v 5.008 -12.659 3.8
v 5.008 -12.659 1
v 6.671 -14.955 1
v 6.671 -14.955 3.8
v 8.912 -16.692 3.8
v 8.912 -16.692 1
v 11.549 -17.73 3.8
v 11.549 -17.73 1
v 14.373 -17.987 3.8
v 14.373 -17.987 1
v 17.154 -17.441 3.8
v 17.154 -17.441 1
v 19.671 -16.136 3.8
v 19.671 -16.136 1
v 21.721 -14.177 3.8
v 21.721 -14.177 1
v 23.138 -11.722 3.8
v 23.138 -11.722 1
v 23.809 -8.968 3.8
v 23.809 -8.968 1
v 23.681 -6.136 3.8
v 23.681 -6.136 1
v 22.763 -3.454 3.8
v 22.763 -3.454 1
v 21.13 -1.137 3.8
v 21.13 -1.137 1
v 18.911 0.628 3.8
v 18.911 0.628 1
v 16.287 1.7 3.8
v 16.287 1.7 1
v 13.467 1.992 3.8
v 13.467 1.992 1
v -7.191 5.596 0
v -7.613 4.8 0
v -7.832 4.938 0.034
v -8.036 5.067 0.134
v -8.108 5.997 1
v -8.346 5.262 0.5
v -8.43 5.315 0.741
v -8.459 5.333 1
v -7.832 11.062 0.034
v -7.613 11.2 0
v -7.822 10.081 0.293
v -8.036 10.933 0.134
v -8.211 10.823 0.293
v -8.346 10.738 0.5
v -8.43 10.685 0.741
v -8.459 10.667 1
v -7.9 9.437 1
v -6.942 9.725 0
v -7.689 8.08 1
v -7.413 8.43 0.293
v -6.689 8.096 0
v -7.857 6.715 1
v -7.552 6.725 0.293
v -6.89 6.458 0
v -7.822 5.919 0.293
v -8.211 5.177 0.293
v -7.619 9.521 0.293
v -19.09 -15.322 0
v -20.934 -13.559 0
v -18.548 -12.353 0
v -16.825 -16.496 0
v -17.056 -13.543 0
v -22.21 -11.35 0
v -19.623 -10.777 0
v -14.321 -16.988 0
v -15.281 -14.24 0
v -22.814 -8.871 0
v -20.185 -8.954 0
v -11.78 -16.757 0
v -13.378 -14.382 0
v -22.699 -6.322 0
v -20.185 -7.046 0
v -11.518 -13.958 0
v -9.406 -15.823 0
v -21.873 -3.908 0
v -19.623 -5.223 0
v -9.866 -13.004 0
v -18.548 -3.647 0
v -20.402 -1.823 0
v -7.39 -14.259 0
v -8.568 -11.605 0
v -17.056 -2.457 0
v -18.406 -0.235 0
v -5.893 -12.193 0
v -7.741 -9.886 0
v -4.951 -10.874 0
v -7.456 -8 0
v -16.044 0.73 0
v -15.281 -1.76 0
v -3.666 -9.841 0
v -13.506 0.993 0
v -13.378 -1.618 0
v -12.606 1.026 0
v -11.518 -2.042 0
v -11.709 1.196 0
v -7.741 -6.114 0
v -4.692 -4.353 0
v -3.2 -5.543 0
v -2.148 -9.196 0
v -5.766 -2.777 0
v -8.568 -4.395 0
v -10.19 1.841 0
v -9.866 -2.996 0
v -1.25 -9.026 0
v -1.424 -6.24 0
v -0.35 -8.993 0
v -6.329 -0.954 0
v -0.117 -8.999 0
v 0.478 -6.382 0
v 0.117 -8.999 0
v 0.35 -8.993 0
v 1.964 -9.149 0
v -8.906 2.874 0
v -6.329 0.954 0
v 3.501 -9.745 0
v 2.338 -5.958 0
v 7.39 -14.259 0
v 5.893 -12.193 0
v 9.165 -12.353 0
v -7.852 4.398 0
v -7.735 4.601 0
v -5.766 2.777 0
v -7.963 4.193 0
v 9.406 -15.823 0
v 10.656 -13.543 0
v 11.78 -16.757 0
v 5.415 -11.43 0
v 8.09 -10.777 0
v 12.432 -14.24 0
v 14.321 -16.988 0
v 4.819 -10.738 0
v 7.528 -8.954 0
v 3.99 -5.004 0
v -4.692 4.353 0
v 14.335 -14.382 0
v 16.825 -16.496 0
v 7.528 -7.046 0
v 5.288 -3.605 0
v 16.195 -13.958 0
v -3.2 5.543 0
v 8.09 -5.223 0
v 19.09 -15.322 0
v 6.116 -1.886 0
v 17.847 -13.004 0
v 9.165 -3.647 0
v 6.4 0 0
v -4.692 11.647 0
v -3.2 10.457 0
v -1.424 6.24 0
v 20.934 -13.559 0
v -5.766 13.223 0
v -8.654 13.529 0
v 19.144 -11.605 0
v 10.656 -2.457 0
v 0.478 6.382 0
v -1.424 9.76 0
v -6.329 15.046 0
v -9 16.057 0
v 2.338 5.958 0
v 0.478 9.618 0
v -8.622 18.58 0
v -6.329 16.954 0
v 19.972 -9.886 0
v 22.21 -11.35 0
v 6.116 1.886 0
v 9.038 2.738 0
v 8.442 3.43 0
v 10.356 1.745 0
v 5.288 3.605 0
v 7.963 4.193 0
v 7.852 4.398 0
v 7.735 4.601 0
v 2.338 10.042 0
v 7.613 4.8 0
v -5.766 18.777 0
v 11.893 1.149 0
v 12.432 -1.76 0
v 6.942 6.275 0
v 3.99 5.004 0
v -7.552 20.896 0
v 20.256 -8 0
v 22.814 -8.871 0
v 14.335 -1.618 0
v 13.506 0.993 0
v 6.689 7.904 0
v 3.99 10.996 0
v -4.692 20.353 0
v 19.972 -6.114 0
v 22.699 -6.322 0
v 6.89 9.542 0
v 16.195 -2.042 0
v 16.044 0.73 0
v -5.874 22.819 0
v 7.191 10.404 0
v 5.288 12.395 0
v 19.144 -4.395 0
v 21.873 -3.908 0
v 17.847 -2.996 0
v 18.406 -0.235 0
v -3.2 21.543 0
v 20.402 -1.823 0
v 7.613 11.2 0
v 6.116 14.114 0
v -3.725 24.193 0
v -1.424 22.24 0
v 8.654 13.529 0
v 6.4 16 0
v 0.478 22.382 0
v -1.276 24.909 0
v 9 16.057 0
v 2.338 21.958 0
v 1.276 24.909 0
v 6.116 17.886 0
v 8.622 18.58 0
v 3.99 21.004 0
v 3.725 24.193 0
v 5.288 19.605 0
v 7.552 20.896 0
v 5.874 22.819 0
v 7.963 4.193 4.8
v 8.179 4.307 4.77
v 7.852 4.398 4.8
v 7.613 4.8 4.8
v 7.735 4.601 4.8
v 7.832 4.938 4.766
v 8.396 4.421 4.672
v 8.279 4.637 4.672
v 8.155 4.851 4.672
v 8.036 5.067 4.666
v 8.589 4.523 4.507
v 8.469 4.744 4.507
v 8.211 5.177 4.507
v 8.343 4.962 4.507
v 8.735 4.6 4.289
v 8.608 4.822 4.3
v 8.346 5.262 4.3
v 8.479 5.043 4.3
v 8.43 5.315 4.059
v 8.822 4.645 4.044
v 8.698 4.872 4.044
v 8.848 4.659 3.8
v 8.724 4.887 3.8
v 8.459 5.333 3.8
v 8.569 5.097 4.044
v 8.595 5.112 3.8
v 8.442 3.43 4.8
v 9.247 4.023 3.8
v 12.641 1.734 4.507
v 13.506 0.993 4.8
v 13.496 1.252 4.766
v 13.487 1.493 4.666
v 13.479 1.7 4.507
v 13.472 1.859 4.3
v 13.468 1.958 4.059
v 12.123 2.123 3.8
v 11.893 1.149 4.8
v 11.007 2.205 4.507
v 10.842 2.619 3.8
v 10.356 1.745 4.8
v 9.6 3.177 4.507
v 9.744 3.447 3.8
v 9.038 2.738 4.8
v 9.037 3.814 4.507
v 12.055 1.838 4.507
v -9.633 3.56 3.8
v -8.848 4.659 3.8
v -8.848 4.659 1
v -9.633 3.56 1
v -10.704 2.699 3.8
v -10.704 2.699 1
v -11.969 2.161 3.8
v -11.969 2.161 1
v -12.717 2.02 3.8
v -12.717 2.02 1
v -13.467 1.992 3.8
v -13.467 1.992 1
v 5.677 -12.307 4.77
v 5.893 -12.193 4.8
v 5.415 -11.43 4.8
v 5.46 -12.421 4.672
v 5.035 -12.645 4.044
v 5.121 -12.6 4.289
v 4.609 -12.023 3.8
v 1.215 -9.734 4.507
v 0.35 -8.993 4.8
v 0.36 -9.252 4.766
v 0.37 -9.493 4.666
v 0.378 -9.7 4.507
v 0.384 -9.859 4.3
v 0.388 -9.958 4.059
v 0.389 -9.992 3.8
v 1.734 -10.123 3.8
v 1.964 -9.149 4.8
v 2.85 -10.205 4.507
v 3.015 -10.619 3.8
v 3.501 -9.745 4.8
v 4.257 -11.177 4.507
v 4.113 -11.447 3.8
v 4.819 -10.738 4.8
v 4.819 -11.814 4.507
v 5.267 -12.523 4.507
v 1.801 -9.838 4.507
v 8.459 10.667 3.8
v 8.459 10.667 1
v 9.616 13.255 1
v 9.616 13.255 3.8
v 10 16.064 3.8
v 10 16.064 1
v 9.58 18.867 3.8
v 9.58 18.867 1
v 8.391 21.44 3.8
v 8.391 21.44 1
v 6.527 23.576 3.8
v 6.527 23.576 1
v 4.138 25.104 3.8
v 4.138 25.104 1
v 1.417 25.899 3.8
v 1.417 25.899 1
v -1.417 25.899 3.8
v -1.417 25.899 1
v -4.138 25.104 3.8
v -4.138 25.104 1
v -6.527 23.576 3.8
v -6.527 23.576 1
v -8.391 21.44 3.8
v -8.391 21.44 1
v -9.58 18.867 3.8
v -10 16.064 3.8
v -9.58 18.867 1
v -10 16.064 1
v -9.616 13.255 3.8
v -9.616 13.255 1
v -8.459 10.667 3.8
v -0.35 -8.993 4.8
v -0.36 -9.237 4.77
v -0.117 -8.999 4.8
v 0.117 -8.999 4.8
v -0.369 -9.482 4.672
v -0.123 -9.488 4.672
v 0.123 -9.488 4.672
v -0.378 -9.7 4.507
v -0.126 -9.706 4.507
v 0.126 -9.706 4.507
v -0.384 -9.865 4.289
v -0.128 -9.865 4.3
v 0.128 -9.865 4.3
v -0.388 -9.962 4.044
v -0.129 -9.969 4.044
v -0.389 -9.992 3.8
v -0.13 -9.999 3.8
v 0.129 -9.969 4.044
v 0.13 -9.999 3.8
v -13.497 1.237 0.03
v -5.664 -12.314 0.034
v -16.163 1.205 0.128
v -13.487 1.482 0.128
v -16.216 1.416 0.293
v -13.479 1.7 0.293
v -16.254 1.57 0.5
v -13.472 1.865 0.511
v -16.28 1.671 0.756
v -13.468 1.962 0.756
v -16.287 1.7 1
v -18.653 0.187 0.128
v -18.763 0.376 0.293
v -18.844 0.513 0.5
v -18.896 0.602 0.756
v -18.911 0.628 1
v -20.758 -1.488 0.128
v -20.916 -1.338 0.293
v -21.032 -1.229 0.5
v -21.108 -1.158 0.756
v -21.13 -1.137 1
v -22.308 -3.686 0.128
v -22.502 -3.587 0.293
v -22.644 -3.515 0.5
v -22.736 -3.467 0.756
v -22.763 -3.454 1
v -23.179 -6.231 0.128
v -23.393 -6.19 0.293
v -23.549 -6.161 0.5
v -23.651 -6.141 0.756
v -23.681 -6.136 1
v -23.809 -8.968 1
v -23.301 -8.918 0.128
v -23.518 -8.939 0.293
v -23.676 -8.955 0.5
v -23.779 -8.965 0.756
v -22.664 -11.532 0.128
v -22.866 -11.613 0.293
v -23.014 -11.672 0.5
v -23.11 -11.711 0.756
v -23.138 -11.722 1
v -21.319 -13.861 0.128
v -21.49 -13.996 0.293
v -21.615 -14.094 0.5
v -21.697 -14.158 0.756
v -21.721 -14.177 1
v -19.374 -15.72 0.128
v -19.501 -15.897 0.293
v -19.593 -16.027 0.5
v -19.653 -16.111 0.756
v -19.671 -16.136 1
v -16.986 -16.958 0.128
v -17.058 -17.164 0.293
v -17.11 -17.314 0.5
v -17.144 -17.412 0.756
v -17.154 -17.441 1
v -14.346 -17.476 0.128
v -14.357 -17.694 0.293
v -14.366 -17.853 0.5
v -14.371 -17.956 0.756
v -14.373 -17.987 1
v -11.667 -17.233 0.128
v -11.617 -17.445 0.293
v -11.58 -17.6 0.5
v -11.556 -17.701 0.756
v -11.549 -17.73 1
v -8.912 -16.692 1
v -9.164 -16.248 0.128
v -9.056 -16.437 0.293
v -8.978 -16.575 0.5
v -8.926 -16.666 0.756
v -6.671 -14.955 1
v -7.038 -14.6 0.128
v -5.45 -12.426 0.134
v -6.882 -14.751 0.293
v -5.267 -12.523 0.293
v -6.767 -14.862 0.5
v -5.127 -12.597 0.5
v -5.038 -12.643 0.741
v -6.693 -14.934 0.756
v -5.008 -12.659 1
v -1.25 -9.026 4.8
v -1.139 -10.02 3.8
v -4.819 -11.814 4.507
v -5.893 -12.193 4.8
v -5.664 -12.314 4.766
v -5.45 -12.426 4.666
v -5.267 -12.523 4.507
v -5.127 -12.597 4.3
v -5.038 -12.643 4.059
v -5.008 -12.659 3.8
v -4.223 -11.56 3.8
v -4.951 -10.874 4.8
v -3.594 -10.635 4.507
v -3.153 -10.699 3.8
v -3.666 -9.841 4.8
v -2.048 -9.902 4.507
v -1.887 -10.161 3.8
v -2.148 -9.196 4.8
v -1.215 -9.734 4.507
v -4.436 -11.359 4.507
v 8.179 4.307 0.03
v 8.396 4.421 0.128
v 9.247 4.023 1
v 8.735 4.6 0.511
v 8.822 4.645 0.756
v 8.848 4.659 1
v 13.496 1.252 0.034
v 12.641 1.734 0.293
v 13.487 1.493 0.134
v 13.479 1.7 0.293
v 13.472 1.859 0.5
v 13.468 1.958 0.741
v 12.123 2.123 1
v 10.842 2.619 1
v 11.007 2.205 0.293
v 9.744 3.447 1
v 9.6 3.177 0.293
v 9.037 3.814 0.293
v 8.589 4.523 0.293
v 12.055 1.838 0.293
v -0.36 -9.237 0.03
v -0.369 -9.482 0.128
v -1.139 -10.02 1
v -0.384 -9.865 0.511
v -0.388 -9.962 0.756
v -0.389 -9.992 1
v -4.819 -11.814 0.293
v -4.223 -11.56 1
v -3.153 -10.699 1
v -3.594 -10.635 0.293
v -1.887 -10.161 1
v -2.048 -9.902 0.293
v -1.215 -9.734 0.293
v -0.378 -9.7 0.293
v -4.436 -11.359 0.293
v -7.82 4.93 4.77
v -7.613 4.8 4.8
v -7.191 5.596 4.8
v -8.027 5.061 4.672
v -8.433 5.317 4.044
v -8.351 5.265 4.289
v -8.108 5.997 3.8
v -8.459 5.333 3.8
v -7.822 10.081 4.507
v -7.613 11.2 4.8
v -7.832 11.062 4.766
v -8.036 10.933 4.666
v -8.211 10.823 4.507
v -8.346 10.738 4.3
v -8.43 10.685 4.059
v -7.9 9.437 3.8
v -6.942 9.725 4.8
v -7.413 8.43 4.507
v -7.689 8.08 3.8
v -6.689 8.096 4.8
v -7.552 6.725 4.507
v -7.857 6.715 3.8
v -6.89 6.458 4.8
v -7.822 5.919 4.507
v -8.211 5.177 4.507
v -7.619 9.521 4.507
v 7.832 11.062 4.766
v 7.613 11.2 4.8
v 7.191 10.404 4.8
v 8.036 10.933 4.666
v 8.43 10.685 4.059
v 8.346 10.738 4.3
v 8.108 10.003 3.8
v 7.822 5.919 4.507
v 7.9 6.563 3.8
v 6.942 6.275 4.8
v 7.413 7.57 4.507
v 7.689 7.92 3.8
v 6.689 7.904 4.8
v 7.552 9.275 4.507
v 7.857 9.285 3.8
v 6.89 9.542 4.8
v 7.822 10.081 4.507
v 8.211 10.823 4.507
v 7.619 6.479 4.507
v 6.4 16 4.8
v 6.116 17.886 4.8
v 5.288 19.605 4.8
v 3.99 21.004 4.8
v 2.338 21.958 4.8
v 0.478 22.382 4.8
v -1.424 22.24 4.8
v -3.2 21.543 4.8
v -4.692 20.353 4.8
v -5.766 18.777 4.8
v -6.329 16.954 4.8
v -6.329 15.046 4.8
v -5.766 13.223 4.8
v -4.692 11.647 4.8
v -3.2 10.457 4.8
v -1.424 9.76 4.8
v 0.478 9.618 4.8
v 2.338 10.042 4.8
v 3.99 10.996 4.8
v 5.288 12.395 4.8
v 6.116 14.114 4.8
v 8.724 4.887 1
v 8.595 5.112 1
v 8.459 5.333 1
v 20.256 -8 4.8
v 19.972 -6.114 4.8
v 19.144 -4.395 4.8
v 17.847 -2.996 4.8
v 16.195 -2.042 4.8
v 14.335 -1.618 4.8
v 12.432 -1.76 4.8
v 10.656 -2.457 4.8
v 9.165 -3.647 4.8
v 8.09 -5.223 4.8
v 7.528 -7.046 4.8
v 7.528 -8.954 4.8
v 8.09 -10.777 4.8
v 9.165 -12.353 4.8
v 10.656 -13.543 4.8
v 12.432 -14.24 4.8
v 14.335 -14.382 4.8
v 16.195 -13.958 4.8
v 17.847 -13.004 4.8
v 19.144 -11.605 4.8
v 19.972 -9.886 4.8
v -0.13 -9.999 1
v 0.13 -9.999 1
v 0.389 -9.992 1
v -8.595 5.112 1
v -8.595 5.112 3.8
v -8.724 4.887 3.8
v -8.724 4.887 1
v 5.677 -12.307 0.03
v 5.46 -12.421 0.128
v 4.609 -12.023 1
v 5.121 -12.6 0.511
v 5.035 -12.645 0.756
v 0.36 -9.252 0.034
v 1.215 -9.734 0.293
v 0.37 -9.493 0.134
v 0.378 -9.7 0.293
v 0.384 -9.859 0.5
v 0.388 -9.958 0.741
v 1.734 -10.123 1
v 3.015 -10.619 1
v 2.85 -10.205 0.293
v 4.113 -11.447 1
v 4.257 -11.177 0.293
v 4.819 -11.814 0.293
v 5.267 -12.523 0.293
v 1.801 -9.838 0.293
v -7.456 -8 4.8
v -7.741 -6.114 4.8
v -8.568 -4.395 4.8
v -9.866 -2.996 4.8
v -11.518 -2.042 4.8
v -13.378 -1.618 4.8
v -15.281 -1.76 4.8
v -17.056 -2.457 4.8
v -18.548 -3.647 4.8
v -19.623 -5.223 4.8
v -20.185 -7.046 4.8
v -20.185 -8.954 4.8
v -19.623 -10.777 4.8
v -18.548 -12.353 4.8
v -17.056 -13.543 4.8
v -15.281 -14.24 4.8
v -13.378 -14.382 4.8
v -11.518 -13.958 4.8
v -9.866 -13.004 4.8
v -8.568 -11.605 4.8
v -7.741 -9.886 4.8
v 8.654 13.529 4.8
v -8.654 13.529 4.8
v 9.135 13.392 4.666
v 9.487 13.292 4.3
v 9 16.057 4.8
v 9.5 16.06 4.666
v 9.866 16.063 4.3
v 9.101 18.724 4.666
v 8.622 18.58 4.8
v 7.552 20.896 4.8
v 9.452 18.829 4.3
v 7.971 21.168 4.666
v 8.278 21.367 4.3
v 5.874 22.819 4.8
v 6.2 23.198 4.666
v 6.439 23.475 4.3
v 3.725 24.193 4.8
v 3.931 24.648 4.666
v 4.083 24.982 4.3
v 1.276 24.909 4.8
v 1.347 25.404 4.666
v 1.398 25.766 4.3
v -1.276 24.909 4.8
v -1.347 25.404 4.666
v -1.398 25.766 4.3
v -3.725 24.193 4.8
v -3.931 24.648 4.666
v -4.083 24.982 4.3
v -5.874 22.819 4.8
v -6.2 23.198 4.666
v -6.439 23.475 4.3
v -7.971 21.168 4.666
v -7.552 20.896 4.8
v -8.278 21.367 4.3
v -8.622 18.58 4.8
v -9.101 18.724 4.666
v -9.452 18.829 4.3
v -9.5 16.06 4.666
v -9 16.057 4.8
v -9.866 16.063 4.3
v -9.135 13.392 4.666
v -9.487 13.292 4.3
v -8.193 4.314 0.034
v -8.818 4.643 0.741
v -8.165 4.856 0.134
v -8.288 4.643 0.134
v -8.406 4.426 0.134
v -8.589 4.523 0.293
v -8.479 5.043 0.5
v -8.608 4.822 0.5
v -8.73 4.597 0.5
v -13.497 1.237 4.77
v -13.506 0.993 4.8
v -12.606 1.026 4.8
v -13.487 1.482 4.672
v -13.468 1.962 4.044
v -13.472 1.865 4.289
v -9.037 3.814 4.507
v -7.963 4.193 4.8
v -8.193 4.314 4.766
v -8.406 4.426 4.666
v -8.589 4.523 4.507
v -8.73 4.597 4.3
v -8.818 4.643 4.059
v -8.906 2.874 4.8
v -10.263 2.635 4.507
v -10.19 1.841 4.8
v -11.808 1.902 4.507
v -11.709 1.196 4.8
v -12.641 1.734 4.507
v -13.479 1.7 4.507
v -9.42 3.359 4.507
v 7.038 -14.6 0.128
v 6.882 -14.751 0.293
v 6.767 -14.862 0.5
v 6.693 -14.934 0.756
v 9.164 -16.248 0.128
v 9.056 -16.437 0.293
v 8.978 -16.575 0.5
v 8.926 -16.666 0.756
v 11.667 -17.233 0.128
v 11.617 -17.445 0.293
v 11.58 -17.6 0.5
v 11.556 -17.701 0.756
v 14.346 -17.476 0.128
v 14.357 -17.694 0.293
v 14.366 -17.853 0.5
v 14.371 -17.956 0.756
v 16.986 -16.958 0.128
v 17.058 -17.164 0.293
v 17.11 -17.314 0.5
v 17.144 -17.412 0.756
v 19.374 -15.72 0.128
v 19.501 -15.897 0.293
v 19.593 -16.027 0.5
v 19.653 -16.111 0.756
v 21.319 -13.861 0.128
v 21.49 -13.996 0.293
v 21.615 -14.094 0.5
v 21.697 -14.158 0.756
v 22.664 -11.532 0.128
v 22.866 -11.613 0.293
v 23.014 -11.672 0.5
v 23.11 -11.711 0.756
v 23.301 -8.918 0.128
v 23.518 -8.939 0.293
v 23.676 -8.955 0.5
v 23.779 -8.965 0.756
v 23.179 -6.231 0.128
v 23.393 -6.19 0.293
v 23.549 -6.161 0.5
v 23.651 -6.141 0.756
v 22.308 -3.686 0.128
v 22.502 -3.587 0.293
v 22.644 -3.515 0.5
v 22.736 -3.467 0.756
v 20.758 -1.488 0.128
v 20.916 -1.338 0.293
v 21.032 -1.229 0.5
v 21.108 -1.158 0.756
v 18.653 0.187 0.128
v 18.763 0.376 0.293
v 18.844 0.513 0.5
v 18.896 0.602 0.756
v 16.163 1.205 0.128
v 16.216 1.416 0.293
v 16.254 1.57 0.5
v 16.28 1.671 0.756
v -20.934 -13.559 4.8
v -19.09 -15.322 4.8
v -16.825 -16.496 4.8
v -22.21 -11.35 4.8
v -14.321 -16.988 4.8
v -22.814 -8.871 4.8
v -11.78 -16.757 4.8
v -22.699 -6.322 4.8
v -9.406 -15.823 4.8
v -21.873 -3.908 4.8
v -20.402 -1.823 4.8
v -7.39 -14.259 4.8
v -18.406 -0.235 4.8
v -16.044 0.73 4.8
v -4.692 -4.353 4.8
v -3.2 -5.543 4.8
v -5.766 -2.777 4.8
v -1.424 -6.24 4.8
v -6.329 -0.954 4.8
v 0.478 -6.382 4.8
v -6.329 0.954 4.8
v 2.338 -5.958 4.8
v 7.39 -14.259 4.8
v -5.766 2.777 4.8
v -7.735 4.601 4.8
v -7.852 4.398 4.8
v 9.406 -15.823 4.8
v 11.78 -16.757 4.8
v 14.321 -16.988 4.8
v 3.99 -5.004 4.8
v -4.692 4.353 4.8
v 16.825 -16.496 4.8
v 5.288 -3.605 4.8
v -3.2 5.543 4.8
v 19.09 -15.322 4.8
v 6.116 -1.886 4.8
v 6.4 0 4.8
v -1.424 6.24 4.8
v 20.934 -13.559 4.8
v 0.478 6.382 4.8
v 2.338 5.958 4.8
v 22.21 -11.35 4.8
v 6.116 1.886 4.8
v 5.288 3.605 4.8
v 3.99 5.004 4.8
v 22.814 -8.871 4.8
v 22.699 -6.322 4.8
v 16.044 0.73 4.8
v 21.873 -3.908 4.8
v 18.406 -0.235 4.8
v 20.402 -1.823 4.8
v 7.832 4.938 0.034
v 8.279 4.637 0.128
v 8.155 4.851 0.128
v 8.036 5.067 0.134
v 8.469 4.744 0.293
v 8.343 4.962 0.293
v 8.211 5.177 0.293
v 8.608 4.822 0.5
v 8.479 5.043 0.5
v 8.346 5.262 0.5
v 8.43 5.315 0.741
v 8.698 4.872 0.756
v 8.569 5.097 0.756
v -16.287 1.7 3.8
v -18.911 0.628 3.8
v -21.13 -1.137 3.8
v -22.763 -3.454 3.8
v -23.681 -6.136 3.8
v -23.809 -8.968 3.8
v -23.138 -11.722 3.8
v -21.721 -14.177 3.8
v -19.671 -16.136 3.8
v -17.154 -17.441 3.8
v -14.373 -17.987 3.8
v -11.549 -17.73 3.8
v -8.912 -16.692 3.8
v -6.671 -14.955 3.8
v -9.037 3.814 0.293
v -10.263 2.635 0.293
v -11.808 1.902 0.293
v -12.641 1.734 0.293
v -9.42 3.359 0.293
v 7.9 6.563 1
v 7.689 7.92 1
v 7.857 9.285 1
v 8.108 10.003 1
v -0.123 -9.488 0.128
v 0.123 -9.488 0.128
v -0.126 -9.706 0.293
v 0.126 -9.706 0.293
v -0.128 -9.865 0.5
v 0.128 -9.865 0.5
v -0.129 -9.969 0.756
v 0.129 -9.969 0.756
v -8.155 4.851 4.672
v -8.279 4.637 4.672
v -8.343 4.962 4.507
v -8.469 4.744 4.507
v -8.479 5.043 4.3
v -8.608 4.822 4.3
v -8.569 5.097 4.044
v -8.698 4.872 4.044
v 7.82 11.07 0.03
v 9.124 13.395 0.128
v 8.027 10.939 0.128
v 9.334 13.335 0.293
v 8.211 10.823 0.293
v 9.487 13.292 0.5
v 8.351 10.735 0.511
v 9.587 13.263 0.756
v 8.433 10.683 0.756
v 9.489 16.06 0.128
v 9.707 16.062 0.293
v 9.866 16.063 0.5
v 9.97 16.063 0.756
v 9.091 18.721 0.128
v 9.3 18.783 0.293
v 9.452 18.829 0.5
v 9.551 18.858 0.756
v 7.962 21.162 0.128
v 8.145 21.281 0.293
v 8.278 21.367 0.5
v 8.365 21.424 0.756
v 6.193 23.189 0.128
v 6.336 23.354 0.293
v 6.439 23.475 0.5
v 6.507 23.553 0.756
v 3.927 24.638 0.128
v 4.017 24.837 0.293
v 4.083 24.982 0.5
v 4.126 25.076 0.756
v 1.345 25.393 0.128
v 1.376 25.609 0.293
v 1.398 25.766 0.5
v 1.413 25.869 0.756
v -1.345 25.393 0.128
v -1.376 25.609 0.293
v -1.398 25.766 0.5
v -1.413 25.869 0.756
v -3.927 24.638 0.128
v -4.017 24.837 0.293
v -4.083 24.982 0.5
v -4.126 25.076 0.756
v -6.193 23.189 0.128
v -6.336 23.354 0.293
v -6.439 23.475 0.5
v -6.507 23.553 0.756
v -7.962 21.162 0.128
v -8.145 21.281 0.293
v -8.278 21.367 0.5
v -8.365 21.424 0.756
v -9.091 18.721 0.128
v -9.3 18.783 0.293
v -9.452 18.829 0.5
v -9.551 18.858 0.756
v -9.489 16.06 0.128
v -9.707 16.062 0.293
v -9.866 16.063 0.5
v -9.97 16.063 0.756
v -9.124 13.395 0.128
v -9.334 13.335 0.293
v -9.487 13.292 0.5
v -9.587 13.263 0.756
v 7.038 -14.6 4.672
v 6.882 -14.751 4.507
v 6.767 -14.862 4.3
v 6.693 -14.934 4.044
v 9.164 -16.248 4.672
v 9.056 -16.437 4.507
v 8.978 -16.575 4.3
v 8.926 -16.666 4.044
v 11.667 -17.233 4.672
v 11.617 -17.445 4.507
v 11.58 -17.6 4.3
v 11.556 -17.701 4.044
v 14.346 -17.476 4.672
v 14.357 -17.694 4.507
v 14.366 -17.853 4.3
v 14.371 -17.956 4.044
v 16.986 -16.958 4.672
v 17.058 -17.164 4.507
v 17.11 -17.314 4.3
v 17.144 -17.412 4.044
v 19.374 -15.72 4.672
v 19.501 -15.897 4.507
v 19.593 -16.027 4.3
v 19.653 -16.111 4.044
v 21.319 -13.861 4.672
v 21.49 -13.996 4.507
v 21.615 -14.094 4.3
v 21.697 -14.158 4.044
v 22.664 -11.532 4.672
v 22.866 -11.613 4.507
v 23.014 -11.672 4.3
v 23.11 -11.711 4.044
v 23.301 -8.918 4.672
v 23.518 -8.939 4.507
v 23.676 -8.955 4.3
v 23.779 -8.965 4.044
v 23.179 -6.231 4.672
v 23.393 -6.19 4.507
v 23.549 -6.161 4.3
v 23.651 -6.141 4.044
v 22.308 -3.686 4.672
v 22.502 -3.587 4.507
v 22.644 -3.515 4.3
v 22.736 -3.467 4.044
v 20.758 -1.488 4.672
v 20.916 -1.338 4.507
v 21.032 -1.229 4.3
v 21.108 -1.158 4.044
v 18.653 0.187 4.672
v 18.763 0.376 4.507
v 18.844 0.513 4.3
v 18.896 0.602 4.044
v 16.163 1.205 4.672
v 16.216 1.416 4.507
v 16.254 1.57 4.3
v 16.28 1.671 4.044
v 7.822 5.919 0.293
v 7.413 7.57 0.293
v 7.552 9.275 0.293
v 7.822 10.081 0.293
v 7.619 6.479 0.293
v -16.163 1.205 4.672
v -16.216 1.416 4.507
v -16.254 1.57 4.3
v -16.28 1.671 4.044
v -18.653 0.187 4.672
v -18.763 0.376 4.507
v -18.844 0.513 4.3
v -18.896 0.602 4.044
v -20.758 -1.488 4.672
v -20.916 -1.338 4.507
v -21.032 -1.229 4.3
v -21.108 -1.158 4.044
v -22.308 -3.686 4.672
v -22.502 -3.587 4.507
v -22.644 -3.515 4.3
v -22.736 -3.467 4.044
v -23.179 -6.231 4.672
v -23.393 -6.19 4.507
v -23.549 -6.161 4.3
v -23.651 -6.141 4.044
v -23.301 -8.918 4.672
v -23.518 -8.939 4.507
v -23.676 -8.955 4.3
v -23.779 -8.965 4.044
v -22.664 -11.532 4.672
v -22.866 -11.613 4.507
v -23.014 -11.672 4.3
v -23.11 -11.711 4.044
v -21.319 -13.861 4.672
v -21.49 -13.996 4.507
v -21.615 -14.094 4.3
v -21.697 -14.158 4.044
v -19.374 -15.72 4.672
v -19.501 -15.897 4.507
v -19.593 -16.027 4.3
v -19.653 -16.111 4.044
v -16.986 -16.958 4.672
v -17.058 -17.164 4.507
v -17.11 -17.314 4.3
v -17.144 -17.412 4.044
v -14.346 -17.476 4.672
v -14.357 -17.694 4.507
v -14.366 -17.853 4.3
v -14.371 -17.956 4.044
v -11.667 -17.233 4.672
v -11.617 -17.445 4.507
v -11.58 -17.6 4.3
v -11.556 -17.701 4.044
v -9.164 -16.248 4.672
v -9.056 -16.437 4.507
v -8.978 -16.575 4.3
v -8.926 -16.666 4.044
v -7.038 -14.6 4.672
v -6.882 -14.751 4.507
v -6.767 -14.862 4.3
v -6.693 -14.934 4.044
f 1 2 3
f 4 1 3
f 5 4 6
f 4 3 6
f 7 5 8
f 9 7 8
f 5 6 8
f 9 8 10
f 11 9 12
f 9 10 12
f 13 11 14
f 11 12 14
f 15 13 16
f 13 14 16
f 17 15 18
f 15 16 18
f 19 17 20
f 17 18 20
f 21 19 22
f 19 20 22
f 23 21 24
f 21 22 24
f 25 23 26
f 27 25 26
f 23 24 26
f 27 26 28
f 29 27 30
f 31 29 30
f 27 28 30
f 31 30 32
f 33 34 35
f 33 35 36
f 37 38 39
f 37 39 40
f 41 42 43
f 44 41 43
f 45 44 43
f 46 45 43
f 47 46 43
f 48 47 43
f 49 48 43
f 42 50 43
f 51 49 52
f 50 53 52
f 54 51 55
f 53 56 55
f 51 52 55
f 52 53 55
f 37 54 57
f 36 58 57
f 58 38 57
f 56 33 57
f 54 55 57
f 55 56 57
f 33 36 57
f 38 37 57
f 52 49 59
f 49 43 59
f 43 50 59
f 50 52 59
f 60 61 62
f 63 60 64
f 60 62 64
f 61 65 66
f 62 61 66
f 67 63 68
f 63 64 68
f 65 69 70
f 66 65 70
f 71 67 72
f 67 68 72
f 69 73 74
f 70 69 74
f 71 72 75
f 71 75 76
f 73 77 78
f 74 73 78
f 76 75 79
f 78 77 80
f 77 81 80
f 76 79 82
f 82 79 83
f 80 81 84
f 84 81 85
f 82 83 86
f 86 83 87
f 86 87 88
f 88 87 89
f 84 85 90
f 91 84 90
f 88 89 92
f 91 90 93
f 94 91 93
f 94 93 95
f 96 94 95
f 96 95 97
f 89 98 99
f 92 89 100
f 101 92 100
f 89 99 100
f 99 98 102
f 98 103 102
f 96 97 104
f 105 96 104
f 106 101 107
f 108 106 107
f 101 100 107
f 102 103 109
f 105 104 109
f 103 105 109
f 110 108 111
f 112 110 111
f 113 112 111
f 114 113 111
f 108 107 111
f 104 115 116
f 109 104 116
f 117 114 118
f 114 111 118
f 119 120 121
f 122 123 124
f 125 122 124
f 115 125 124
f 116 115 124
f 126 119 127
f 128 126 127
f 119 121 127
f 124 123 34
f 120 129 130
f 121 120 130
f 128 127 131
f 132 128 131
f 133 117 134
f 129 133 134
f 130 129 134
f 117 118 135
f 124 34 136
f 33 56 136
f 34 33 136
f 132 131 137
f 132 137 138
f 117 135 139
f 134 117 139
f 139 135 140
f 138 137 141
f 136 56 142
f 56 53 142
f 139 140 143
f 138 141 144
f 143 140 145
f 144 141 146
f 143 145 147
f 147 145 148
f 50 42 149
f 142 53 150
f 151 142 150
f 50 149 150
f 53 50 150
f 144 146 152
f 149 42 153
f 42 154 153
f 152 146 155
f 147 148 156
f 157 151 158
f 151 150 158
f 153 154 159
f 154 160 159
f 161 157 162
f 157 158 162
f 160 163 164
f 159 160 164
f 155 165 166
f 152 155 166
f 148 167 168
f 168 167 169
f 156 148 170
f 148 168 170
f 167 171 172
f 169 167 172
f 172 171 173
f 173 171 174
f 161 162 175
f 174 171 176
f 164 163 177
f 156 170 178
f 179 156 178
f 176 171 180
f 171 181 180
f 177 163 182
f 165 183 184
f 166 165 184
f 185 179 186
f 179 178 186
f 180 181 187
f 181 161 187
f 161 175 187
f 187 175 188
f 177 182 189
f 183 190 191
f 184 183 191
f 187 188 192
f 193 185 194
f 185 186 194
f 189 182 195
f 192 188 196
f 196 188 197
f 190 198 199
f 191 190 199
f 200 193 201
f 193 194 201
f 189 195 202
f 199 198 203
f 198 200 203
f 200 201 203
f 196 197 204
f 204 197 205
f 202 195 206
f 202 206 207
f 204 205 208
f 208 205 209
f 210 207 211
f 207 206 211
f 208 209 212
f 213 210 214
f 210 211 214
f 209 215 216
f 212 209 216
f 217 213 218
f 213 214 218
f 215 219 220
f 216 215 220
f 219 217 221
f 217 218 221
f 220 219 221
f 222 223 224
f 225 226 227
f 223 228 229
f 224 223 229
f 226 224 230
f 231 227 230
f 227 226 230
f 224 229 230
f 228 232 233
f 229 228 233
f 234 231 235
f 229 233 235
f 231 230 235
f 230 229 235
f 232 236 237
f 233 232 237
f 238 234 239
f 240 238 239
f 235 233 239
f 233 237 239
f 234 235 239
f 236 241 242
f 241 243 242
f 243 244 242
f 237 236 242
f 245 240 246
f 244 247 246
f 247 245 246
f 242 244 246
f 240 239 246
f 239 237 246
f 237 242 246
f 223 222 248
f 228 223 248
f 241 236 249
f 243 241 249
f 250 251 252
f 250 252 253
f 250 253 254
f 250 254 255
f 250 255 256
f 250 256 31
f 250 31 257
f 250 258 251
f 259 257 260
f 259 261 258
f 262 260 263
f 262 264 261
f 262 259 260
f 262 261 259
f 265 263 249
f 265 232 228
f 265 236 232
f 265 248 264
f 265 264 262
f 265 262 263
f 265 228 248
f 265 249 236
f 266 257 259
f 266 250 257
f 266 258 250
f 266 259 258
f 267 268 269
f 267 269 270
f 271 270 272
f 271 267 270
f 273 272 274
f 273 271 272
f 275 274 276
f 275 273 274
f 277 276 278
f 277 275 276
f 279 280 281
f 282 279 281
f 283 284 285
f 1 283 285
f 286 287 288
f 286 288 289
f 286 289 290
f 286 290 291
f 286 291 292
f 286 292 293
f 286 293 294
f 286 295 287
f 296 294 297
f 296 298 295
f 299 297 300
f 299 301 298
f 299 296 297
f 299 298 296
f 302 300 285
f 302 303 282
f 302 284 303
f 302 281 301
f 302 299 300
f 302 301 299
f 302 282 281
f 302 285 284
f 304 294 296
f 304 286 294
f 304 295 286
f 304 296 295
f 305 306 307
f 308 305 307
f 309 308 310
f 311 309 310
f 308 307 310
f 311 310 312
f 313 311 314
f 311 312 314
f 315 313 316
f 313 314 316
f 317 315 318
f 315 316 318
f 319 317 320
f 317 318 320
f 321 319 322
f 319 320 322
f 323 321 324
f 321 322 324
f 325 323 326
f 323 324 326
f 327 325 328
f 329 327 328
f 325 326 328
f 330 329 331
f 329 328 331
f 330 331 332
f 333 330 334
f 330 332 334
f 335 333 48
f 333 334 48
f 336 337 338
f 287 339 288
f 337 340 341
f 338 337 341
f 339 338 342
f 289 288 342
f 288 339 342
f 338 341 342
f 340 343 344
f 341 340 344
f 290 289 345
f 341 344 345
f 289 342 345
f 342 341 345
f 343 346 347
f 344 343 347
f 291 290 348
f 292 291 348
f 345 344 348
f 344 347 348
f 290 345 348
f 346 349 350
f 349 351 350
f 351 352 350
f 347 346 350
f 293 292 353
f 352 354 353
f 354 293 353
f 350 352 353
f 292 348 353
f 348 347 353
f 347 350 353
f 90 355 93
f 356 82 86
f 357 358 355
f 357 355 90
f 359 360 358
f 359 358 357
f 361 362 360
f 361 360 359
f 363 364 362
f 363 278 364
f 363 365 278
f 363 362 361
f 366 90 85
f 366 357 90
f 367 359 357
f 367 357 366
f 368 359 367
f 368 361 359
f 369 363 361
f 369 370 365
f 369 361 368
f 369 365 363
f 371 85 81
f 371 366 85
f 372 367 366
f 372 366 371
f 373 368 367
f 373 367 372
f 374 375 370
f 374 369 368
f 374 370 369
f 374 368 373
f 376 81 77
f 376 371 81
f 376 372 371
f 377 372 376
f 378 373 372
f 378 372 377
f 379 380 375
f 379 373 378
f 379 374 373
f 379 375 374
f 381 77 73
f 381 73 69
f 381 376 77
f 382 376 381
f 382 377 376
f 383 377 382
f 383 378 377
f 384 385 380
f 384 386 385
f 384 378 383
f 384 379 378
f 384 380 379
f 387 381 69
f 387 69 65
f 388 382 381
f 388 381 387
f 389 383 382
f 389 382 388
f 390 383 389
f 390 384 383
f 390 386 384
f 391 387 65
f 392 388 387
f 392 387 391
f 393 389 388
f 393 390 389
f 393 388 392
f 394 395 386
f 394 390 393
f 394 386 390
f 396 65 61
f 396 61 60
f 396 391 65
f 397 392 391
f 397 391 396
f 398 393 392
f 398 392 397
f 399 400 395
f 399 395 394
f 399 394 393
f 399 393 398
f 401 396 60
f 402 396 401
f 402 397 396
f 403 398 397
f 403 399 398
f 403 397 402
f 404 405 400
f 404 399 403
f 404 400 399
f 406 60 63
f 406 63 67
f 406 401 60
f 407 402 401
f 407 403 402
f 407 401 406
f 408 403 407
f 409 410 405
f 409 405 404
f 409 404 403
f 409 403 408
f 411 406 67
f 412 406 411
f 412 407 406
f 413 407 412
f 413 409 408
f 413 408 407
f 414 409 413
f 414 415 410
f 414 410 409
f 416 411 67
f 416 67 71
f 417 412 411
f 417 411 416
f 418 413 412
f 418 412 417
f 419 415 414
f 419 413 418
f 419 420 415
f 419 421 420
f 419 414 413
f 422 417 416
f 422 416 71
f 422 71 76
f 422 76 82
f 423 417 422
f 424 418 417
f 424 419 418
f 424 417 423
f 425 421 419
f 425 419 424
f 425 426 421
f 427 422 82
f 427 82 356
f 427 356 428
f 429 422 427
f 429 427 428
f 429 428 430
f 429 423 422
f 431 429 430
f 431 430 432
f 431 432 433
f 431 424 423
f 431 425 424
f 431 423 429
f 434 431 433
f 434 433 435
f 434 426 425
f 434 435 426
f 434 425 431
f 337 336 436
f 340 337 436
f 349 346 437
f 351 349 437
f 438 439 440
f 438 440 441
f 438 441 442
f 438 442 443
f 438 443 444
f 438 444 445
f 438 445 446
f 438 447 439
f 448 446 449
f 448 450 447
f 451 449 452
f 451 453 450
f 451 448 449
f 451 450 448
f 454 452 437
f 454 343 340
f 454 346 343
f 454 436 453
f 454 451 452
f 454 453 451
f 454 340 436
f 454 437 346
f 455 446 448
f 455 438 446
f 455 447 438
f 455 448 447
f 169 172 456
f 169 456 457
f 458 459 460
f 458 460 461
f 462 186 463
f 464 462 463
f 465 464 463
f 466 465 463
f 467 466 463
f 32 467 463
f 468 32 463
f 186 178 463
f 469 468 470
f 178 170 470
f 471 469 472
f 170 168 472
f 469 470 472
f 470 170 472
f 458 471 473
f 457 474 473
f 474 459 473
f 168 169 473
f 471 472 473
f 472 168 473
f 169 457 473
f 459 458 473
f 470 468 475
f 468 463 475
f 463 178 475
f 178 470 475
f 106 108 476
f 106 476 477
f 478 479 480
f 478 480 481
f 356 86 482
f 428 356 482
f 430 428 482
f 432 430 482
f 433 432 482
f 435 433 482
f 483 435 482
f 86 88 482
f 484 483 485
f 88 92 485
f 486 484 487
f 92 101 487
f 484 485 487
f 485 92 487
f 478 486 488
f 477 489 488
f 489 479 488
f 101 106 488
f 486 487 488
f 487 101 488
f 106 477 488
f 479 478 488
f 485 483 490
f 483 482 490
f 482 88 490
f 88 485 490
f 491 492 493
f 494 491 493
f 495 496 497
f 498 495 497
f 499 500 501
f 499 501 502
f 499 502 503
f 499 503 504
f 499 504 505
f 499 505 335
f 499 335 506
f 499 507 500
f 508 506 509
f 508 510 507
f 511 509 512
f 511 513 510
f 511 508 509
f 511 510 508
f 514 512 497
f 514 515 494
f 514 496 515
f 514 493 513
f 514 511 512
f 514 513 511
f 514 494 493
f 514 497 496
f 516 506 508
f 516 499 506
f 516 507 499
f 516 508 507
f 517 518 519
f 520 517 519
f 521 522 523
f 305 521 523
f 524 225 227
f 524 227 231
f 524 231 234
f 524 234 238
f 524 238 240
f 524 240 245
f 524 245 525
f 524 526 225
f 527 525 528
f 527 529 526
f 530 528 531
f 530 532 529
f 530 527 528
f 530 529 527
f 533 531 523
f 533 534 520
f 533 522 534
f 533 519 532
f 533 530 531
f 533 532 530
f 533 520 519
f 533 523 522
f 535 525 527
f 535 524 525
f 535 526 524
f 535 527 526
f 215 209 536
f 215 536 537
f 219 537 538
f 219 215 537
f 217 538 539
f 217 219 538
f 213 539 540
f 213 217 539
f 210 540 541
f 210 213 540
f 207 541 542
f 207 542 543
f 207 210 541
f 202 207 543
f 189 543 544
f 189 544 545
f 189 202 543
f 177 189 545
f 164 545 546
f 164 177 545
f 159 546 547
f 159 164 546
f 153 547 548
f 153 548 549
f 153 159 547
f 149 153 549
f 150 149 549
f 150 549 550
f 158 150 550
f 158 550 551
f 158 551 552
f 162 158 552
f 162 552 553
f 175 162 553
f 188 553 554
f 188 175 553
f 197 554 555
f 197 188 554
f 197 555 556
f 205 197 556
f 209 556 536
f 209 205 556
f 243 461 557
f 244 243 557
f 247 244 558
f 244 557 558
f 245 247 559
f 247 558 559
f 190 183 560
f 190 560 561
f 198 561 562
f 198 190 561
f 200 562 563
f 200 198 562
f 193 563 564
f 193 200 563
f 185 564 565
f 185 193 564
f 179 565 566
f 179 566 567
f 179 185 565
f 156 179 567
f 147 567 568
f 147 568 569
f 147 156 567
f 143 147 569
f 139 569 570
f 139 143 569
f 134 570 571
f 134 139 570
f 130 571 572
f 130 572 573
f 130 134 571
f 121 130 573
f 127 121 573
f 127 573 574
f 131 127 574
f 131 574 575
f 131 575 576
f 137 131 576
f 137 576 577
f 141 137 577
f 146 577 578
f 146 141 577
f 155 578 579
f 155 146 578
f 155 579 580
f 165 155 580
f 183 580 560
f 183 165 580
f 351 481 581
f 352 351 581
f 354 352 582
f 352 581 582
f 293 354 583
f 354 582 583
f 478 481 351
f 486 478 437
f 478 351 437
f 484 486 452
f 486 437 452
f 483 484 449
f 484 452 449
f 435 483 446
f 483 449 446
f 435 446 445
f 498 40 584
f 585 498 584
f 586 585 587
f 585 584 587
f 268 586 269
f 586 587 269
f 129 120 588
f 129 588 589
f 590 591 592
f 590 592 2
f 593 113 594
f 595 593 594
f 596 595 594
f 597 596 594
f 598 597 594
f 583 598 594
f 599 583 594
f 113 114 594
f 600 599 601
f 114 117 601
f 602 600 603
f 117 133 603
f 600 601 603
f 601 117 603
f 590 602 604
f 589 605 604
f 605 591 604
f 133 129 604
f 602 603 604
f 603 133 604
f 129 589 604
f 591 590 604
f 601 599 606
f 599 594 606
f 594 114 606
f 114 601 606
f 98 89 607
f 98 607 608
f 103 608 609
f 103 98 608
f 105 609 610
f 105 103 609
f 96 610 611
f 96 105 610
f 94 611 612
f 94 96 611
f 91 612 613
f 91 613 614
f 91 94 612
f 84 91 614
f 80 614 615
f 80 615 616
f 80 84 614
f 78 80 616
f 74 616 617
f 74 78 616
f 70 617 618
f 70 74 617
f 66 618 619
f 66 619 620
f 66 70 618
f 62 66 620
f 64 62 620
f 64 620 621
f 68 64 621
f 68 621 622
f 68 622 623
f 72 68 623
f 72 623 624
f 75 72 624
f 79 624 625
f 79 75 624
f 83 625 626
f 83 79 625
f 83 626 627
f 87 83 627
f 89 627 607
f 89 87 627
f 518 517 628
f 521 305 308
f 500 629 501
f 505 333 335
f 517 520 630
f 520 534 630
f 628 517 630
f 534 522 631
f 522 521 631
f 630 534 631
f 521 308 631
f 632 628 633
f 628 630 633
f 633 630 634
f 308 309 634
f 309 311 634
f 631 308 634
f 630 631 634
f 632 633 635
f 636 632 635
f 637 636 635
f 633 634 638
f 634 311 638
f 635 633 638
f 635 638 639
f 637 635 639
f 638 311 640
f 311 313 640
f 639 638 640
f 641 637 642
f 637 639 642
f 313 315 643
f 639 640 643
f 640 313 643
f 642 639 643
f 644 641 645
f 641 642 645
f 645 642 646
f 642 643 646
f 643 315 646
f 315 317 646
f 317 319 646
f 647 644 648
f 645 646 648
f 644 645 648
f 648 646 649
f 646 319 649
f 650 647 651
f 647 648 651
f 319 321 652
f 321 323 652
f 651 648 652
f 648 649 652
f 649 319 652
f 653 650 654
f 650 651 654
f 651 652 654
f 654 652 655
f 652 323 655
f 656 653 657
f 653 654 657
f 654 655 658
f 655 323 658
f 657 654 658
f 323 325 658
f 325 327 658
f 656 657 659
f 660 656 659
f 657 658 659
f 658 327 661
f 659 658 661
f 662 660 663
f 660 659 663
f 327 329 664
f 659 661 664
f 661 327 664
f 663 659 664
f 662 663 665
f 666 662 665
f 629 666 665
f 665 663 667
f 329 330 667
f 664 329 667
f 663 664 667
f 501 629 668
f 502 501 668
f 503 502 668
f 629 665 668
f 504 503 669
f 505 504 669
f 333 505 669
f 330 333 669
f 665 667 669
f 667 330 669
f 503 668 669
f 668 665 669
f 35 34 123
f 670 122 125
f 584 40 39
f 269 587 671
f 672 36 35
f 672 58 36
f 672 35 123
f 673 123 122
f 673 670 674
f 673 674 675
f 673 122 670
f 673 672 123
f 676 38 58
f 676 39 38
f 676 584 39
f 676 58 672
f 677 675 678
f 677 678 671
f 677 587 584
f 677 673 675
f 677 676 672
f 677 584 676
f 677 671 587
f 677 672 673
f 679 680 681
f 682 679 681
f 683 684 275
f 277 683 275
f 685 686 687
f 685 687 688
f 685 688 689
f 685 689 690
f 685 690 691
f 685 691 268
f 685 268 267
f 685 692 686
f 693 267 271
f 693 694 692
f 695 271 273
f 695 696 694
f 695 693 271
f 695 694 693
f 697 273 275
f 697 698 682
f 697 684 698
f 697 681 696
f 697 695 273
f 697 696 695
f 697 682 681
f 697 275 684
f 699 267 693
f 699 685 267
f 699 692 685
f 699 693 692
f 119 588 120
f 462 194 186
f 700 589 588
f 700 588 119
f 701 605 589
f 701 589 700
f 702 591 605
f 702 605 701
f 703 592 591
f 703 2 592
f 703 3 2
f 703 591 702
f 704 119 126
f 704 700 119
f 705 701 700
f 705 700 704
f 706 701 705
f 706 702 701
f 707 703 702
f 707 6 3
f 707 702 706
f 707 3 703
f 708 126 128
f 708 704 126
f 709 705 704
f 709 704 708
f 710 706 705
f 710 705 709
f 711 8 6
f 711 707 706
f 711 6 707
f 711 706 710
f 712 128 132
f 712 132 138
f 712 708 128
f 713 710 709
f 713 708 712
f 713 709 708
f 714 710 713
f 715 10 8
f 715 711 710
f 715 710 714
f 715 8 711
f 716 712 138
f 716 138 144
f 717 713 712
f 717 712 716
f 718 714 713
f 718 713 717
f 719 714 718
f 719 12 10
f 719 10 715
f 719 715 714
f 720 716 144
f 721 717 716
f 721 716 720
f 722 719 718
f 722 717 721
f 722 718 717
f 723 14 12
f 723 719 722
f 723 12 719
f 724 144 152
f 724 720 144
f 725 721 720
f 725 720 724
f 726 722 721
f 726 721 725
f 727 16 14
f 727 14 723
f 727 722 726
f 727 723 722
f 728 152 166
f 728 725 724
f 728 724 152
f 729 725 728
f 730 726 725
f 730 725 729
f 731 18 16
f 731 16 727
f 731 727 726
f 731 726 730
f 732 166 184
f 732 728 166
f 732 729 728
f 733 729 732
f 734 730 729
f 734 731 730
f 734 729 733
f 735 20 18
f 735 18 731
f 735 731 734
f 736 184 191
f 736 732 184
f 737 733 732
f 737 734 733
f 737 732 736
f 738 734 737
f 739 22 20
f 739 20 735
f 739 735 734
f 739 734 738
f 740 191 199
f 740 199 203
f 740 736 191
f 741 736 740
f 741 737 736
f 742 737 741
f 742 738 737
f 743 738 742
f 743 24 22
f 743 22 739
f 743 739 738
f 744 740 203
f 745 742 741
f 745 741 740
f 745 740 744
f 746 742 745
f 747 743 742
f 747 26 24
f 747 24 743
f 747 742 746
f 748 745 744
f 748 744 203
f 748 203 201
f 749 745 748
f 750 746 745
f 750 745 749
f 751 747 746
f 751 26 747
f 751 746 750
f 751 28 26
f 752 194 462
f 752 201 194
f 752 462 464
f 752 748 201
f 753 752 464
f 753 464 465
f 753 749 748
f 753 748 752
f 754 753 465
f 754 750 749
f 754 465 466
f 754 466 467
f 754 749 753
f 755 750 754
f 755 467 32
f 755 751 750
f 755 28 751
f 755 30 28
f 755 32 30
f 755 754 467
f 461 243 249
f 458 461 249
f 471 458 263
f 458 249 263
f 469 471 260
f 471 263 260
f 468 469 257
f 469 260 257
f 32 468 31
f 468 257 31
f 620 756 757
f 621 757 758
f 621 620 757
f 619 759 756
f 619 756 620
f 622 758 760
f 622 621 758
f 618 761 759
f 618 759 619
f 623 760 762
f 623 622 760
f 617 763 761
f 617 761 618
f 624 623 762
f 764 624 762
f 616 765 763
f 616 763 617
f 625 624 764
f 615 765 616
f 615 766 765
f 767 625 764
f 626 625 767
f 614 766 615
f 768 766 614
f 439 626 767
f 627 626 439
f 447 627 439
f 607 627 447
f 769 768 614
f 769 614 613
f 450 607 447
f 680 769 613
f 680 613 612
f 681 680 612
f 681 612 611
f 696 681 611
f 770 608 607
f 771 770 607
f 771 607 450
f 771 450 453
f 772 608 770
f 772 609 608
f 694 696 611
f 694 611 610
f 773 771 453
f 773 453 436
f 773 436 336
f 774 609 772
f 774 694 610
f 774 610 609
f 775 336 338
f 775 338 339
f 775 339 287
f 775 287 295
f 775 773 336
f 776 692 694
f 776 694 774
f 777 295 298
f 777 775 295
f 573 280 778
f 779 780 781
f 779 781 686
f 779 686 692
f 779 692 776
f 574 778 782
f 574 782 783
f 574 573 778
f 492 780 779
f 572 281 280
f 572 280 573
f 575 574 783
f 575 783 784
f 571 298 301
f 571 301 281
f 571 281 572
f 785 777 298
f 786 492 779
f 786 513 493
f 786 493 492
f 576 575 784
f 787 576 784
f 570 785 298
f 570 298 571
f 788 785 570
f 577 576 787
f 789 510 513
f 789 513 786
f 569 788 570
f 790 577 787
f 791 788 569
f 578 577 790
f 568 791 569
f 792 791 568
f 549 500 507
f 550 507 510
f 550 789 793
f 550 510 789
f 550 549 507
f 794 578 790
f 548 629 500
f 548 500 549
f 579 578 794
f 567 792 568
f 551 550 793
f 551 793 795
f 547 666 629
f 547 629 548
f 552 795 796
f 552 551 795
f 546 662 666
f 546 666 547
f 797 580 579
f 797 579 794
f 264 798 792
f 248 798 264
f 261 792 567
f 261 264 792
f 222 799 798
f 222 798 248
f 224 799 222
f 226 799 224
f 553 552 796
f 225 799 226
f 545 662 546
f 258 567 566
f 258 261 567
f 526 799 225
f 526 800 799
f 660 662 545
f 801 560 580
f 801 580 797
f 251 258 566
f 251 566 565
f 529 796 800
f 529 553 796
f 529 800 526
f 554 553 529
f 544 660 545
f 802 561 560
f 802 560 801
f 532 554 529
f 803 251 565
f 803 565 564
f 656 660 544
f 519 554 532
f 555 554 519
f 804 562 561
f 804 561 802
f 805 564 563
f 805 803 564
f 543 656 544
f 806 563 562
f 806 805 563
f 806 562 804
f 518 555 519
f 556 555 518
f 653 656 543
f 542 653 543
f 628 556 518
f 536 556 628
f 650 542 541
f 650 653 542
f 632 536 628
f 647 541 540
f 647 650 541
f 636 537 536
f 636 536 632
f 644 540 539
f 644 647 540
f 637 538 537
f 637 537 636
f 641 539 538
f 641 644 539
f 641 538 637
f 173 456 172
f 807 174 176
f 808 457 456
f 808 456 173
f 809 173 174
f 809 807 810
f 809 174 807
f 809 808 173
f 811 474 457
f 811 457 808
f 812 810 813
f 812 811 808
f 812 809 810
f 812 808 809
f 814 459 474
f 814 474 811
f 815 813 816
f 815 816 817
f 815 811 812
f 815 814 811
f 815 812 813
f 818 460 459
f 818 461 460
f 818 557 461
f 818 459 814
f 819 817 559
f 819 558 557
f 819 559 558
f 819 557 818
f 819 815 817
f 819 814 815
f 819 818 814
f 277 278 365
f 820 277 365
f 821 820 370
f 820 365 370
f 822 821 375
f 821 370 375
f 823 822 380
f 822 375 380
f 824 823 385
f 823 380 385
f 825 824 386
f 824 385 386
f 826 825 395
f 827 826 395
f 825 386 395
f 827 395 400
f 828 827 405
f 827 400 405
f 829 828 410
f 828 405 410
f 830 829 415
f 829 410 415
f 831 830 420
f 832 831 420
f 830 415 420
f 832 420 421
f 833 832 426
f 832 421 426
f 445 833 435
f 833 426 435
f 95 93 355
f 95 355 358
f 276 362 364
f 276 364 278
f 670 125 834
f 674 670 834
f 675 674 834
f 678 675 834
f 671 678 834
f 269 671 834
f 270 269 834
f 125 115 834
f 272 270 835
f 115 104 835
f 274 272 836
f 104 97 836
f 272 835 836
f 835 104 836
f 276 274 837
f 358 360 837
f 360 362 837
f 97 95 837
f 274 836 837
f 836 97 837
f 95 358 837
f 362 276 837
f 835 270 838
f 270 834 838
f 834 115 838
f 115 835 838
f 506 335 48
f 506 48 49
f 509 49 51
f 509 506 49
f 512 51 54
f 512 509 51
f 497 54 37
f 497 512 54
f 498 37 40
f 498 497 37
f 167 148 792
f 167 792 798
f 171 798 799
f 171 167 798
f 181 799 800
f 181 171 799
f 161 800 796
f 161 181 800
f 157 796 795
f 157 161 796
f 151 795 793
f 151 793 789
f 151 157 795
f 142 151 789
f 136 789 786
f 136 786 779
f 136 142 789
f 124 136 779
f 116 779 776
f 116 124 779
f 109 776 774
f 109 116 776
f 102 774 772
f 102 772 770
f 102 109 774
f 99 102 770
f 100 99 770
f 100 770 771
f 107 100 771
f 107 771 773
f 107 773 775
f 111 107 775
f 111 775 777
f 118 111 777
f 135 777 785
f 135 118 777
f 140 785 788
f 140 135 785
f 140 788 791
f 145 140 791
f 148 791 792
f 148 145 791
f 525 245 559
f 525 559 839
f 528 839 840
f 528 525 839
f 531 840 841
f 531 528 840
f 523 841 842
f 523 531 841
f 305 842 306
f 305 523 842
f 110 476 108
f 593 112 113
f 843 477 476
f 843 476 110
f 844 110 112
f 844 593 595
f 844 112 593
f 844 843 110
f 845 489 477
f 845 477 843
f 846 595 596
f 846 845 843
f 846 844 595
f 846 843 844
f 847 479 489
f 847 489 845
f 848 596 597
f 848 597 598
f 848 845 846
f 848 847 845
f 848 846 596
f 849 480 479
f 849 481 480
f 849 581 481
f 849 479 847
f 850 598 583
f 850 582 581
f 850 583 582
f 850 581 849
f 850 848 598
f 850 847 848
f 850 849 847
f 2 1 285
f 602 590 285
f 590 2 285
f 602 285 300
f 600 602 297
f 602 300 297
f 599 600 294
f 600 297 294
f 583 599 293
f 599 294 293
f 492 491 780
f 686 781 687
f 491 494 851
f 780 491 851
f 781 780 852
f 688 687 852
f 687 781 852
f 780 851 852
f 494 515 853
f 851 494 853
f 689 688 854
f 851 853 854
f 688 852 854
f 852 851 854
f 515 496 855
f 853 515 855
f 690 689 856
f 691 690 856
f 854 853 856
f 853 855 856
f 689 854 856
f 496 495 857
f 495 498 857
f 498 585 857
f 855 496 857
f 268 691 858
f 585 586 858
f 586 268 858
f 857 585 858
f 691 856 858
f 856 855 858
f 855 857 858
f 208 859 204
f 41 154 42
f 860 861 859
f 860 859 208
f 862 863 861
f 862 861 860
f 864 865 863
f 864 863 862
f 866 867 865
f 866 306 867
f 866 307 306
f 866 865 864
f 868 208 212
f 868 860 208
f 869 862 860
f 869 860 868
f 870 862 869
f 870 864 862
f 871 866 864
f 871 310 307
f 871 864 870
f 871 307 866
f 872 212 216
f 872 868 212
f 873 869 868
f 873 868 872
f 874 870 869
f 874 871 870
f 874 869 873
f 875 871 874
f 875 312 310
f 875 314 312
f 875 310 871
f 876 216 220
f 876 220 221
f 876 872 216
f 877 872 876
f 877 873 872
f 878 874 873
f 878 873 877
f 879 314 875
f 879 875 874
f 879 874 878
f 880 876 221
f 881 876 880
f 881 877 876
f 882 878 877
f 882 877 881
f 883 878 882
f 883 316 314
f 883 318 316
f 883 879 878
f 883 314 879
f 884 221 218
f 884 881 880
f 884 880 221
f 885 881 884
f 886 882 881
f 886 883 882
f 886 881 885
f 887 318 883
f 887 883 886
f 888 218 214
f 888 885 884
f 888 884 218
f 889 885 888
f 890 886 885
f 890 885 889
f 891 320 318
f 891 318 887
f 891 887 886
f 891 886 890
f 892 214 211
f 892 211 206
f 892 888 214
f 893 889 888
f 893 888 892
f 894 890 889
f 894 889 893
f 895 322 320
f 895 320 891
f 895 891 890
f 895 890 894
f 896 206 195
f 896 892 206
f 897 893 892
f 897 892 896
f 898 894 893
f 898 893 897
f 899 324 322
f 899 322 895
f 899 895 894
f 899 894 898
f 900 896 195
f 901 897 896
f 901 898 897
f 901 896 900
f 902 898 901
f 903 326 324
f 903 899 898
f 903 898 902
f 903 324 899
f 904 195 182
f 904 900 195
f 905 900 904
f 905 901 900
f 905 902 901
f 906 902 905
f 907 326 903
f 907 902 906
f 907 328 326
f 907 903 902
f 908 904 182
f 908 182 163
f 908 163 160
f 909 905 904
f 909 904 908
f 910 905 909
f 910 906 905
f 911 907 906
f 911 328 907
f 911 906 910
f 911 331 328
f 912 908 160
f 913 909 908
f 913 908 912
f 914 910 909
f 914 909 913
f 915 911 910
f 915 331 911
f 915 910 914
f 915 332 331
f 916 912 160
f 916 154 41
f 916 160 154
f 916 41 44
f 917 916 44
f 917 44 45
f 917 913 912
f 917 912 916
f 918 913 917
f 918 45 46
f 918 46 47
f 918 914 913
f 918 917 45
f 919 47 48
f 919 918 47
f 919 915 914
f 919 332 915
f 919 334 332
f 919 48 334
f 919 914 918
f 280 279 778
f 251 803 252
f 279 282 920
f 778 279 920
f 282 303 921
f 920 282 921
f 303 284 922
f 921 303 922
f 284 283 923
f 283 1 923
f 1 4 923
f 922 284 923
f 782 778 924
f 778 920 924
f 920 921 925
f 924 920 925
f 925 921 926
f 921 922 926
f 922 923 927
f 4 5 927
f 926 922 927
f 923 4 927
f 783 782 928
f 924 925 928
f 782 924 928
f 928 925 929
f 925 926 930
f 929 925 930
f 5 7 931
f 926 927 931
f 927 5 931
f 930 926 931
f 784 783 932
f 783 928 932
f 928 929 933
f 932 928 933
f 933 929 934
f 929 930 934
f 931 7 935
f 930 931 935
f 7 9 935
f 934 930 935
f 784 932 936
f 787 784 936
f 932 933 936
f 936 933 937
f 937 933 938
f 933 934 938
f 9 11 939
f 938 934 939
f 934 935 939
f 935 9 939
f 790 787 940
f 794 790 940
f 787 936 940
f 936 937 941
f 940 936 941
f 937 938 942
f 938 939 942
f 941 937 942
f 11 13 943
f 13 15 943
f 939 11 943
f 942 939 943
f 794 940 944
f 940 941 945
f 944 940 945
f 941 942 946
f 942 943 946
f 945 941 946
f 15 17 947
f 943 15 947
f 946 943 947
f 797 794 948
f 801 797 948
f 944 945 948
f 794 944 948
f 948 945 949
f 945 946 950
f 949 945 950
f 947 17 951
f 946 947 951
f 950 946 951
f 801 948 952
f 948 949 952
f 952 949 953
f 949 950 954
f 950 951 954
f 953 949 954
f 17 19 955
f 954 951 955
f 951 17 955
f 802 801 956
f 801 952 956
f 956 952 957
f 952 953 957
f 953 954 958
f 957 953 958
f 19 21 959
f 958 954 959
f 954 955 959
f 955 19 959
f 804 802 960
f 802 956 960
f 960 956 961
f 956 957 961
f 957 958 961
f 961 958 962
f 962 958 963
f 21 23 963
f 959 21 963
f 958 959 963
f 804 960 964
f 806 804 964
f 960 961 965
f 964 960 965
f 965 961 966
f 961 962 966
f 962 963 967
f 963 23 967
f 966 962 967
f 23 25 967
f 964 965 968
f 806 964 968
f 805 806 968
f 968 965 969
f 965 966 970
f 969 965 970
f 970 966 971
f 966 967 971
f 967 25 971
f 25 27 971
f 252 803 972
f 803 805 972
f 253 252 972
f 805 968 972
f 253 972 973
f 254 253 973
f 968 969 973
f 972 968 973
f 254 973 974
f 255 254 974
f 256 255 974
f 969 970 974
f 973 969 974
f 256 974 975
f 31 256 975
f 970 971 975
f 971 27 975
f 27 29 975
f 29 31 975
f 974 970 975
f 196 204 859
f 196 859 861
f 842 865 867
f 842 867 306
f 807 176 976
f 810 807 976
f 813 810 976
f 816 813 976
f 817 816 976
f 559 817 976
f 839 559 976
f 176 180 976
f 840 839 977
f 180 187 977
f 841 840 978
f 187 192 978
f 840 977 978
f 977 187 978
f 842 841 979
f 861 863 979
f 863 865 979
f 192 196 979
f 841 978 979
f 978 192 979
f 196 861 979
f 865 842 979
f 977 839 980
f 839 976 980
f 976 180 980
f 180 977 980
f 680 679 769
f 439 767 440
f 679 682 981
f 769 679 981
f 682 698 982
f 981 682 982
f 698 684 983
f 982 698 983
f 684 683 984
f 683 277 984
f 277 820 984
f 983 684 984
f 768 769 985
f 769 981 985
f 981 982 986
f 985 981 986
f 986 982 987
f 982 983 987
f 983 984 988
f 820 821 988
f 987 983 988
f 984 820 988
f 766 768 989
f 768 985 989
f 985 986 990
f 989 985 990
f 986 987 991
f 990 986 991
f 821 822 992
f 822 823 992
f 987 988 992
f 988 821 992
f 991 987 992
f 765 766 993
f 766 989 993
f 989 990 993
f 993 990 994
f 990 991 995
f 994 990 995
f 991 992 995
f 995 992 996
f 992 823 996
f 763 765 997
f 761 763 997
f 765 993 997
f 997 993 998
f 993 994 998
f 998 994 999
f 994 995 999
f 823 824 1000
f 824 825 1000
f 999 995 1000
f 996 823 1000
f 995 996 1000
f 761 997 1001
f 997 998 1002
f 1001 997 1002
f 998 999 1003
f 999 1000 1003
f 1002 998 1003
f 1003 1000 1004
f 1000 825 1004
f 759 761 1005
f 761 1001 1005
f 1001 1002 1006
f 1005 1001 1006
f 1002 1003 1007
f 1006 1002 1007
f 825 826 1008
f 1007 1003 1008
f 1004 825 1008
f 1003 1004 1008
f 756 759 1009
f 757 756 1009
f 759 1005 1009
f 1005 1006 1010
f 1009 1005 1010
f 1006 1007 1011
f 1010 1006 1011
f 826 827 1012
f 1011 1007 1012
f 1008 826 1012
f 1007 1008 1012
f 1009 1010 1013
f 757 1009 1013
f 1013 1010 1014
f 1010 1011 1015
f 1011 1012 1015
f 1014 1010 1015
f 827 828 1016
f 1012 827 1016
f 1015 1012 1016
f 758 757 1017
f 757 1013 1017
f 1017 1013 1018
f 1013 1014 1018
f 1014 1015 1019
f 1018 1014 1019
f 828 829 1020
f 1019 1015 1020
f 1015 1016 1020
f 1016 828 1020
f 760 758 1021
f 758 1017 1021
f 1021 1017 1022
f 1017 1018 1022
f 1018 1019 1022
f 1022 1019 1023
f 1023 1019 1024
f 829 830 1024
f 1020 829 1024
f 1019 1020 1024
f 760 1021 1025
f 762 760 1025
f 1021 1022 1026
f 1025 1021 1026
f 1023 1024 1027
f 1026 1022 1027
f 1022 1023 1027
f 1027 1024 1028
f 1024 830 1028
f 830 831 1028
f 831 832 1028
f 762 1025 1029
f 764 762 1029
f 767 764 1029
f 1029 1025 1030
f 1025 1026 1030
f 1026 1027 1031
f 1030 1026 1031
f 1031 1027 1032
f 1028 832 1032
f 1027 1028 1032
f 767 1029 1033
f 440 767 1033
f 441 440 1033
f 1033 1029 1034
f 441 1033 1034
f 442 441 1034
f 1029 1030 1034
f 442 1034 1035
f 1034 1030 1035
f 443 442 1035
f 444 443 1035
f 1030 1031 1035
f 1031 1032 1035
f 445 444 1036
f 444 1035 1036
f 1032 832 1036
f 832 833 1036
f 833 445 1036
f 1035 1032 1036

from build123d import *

# Parameters (mm, degrees)
F0_R     = 6.4
F1_DEPTH = 4.8
F2_R     = 5
F3_R     = 1


with BuildPart() as f1:
    # F0 (on Top) → F1 (new body)
    with BuildSketch(Plane.XY):
        with BuildLine():
            ThreePointArc((9.9282032303, 1.1961524227), (8.6602540378, 5), (6, 8))
            ThreePointArc((6, 8), (0, 26), (-6, 8))
            ThreePointArc((-6, 8), (-8.6602540378, 5), (-9.9282032303, 1.1961524227))
            ThreePointArc((-9.9282032303, 1.1961524227), (-22.5166604984, -13), (-3.9282032303, -9.1961524227))
            ThreePointArc((-3.9282032303, -9.1961524227), (0, -10), (3.9282032303, -9.1961524227))
            ThreePointArc((3.9282032303, -9.1961524227), (22.5166604984, -13), (9.9282032303, 1.1961524227))
        make_face()
        with Locations((-13.8564064606, -8)):
            Circle(F0_R, mode=Mode.SUBTRACT)
        with Locations((13.8564064606, -8)):
            Circle(F0_R, mode=Mode.SUBTRACT)
        Circle(F0_R, mode=Mode.SUBTRACT)
        with Locations((0, 16)):
            Circle(F0_R, mode=Mode.SUBTRACT)
    extrude(amount=F1_DEPTH)

    # F2
    f2_edges = [f1.edges().sort_by_distance(p)[0] for p in [
        (6, 8, 2.4),
        (9.928203, 1.196152, 2.4),
        (3.928203, -9.196152, 2.4),
        (-3.928203, -9.196152, 2.4),
        (-9.928203, 1.196152, 2.4),
        (-6, 8, 2.4),
    ]]
    fillet(f2_edges, radius=F2_R)

    # F3
    f3_edges = [f1.edges().sort_by_distance(p)[0] for p in [
        (-7.688578, 8, 0),
        (0, 26, 4.8),
    ]]
    fillet(f3_edges, radius=F3_R)


solid = f1.part
